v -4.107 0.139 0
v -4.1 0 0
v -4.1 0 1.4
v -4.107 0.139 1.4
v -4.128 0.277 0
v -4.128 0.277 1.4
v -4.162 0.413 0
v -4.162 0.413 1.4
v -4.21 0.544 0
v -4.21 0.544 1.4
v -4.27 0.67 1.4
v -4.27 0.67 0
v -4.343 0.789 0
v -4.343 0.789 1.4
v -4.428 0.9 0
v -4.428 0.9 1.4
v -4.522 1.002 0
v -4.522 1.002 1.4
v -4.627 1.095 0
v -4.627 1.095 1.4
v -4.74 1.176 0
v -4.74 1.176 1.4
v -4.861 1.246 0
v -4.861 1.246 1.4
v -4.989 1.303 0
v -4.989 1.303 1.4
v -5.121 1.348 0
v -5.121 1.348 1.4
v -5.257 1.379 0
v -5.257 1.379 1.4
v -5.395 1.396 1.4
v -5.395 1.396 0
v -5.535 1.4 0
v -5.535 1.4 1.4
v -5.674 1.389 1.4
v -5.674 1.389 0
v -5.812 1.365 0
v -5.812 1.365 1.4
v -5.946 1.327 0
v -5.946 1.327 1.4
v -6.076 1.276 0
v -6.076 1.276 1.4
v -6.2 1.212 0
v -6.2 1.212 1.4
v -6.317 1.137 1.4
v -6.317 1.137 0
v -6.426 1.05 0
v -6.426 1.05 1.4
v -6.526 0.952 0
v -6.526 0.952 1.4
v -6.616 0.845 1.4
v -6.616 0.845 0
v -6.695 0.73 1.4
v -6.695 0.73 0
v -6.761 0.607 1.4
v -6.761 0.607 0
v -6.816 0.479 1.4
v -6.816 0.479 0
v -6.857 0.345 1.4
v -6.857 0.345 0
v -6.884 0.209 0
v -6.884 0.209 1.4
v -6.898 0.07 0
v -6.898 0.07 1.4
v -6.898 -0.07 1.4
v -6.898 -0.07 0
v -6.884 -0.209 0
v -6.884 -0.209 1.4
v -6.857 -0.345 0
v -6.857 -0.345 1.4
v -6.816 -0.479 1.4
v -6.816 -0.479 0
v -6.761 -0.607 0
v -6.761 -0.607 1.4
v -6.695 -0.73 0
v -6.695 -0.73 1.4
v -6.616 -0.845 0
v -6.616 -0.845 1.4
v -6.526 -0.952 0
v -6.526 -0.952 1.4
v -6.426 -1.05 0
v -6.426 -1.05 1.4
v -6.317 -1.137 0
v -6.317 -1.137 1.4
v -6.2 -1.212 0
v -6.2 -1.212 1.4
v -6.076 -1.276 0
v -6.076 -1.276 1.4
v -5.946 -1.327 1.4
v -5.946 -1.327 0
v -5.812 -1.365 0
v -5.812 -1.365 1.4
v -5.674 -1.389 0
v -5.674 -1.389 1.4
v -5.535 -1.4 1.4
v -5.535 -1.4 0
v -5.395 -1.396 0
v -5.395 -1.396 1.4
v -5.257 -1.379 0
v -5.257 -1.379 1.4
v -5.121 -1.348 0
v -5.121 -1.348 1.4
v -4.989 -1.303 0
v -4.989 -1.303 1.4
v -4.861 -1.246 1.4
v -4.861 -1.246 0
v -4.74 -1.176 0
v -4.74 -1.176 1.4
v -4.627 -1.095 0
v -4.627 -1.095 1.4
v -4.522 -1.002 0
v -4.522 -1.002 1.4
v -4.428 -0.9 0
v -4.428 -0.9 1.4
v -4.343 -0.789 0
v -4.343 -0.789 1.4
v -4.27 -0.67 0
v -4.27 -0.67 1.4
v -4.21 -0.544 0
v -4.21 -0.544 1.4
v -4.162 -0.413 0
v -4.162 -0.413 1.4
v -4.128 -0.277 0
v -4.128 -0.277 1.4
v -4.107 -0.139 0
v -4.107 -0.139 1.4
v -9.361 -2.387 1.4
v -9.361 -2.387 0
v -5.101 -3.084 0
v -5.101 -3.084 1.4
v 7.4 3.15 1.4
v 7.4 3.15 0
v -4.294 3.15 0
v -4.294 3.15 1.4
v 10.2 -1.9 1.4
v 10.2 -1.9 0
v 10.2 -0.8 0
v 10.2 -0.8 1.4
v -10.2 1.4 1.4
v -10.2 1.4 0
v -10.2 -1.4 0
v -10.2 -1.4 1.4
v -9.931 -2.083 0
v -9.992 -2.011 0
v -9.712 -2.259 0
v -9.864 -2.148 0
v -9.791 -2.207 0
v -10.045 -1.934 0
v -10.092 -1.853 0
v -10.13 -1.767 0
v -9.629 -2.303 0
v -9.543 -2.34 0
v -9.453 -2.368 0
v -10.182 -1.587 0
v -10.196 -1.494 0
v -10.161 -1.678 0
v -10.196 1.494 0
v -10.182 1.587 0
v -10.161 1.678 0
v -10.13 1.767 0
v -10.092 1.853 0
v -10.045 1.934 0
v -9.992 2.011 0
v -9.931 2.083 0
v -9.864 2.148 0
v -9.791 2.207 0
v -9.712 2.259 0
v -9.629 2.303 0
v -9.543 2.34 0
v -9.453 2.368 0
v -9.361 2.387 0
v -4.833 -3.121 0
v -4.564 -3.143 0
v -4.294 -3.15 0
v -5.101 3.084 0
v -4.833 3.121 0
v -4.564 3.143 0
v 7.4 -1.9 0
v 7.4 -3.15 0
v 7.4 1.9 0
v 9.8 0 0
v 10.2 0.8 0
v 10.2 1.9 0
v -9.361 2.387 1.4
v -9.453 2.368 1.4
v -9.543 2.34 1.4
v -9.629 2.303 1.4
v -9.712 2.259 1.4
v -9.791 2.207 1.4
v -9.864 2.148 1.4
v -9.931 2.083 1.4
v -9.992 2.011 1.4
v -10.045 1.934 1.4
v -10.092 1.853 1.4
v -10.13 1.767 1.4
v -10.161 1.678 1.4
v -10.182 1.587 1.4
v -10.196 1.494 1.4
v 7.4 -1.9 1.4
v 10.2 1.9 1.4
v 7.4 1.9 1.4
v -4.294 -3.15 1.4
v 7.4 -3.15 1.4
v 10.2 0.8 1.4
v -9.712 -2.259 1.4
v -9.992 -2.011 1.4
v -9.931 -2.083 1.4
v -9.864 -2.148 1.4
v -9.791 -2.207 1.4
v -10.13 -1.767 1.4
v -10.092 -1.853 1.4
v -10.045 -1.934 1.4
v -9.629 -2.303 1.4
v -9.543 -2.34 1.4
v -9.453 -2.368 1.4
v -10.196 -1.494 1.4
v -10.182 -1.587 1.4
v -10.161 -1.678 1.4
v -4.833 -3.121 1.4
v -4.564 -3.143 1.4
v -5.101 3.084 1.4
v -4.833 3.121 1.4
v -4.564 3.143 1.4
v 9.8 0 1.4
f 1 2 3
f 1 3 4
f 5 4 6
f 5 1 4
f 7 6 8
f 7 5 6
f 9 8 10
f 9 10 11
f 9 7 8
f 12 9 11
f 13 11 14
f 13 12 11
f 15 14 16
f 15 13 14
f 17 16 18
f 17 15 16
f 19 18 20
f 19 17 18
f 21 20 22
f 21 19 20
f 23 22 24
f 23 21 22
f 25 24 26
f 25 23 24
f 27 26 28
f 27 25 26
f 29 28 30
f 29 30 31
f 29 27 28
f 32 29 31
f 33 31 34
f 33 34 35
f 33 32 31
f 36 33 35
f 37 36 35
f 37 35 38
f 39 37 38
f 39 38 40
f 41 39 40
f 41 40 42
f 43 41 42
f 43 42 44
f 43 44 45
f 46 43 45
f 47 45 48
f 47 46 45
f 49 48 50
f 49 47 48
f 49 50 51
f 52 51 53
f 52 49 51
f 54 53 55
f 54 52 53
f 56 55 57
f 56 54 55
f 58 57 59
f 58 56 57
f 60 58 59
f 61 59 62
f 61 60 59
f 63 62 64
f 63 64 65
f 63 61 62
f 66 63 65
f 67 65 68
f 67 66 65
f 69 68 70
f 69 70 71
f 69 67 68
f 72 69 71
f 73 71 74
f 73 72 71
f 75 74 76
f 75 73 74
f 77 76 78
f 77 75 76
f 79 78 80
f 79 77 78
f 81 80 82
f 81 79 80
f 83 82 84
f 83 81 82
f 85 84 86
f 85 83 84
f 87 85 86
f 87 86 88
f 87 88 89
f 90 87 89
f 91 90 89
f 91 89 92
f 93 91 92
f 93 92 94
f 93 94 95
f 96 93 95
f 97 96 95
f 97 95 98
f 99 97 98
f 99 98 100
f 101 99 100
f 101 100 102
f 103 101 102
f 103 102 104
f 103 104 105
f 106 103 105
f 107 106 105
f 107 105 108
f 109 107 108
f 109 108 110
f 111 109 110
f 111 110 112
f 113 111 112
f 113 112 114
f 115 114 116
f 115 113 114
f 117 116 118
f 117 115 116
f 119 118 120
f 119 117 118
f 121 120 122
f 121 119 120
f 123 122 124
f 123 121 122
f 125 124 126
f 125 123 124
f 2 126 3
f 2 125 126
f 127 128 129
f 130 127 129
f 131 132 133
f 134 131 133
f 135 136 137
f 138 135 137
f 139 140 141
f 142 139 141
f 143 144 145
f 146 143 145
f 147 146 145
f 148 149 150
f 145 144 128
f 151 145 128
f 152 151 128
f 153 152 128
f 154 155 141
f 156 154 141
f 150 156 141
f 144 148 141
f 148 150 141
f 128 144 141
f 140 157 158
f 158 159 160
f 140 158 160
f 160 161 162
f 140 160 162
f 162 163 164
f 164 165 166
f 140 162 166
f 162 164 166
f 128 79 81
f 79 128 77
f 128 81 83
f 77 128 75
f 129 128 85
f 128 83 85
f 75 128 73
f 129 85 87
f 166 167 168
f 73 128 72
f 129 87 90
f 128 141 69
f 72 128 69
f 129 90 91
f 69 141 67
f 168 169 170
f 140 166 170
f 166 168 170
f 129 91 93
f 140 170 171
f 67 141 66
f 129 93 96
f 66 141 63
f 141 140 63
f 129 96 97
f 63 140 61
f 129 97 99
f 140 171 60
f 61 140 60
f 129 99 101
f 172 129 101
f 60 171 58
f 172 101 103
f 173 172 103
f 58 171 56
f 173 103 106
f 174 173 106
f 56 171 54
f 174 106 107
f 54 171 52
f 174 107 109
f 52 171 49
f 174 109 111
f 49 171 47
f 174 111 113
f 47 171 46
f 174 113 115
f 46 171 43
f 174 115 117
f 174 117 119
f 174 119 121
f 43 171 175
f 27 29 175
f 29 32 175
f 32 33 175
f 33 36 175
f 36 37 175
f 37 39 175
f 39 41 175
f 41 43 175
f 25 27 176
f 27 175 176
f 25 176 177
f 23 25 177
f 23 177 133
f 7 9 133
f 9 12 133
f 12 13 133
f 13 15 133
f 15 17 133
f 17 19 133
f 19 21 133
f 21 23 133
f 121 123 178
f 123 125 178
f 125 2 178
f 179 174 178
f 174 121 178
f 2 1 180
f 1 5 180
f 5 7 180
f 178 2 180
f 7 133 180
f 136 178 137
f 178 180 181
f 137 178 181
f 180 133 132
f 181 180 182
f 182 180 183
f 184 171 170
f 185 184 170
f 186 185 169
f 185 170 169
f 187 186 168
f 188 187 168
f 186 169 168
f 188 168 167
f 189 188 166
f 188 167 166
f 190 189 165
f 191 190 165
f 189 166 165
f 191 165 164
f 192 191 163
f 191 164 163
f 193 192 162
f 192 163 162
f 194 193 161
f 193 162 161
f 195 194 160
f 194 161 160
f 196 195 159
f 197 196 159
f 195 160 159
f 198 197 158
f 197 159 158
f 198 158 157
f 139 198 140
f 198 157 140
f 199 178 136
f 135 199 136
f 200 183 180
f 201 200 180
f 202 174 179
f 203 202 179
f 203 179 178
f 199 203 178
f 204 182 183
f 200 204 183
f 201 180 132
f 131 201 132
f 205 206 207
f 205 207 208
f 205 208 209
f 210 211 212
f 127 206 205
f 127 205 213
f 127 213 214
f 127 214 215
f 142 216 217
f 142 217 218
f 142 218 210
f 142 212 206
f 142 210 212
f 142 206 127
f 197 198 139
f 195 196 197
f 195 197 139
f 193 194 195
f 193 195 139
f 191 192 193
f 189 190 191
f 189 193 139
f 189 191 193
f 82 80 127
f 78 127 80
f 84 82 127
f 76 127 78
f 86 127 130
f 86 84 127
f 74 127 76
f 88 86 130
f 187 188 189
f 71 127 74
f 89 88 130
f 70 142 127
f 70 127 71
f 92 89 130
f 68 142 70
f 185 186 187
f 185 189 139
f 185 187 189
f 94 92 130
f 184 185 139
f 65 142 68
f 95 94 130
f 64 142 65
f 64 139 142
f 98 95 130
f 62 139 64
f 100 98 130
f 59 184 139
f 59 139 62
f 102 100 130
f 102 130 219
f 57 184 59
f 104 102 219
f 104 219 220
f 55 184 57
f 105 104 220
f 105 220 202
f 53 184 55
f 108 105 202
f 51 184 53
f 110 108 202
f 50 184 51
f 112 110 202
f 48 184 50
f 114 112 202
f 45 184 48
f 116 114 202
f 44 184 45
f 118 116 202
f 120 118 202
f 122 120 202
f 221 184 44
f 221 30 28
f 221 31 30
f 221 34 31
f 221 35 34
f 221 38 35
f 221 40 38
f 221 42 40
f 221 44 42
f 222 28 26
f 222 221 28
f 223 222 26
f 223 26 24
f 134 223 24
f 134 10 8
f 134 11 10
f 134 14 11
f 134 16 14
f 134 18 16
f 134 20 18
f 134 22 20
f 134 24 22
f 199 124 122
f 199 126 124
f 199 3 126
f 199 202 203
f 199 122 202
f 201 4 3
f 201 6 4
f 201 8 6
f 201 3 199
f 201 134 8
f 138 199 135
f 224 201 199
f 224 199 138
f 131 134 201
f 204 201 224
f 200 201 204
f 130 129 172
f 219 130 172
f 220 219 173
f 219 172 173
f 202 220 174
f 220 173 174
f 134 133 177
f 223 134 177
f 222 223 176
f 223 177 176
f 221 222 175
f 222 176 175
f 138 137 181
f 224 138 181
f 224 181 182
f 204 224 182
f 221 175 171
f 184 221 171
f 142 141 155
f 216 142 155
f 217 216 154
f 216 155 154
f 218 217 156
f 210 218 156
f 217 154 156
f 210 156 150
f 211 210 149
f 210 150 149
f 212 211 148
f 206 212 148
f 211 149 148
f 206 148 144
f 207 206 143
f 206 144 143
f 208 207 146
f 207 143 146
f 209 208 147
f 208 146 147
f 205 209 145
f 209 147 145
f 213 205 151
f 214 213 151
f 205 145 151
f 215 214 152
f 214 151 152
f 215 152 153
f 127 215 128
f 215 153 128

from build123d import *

# Parameters (mm, degrees)
ESBO_O1_R                = 1.4
RESSALTO_EXTRUS_O1_DEPTH = 1.4


with BuildPart() as part:
    # Esboço1 → Ressalto-extrusão1 (new body)
    with BuildSketch(Plane.XY):
        with BuildLine():
            Line((-5.101054411, 3.084372914), (-9.361488568, 2.387210962))
            ThreePointArc((-9.361488568, 2.387210962), (-9.9620658, 2.047835966), (-10.2, 1.400336379))
            Line((-10.2, 1.400336379), (-10.2, -1.400336379))
            ThreePointArc((-10.2, -1.400336379), (-9.9620658, -2.047835966), (-9.361488568, -2.387210962))
            Line((-9.361488568, -2.387210962), (-5.101054411, -3.084372914))
            ThreePointArc((-5.101054411, -3.084372914), (-4.698664301, -3.133566222), (-4.293611571, -3.15))
            Line((-4.293611571, -3.15), (7.4, -3.15))
            Line((7.4, -3.15), (7.4, -1.9))
            Line((7.4, -1.9), (10.2, -1.9))
            Line((10.2, -1.9), (10.2, -0.8))
            Line((10.2, -0.8), (9.8, 0))
            Line((9.8, 0), (10.2, 0.8))
            Line((10.2, 0.8), (10.2, 1.9))
            Line((10.2, 1.9), (7.4, 1.9))
            Line((7.4, 1.9), (7.4, 3.15))
            Line((7.4, 3.15), (-4.293611571, 3.15))
            ThreePointArc((-4.293611571, 3.15), (-4.698664301, 3.133566222), (-5.101054411, 3.084372914))
        make_face()
        with Locations((-5.5, 0)):
            Circle(ESBO_O1_R, mode=Mode.SUBTRACT)
    extrude(amount=RESSALTO_EXTRUS_O1_DEPTH)


solid = part.part
